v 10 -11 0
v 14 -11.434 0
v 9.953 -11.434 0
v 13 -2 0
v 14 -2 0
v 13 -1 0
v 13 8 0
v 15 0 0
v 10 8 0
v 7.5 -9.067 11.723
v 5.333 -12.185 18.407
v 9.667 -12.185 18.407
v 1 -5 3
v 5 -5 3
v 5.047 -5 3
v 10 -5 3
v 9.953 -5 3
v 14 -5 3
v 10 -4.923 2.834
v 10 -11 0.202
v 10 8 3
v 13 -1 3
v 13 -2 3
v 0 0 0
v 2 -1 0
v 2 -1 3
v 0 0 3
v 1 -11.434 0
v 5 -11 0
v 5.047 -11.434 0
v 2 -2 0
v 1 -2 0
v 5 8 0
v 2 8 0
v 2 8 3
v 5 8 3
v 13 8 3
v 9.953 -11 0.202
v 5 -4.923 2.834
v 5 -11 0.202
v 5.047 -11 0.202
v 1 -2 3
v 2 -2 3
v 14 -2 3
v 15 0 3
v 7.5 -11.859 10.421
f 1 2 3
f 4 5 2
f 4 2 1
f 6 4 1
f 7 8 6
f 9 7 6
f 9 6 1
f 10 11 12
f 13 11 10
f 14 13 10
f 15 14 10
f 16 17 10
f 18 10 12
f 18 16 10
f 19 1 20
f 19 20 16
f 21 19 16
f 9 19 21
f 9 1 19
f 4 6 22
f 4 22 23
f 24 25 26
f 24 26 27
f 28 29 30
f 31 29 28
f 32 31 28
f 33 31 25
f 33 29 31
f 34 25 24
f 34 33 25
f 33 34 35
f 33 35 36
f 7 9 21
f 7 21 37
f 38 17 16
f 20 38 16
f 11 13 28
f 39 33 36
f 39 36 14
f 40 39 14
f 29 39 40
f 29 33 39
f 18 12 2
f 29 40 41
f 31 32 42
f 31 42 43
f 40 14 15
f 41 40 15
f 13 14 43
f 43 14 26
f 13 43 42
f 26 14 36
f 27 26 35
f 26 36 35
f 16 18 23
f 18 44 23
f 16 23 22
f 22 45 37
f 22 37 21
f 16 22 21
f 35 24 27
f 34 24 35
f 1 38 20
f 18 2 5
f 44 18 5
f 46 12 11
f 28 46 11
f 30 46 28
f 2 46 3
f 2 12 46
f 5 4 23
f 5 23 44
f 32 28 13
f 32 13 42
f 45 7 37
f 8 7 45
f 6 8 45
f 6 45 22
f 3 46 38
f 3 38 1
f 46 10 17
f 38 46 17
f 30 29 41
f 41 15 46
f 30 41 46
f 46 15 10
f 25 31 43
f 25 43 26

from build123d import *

# Parameters (mm, degrees)
PAD_DEPTH       = 3
POCKET_DEPTH    = 14.001
SKETCH002_W     = 13
SKETCH002_H     = 7.0986047495
PAD001_DEPTH    = 17
POCKET001_DEPTH = 14.001
POCKET002_DEPTH = 7.7802325517


with BuildPart() as part:
    # Sketch → Pad (new body)
    with BuildSketch(Plane.XY):
        Polygon((0, 0), (2, 8), (5, 8), (5, -11), (10, -11), (10, 8), (13, 8), (15, 0), (13, -1), (13, -2), (14, -2), (14, -12), (1, -12), (1, -2), (2, -2), (2, -1), align=None)
    extrude(amount=PAD_DEPTH)

    # Sketch001 (on Face4 of Pad) → Pocket (cut, through all)
    with BuildSketch(Plane.YZ.offset(14)):
        Polygon((-5, 3), (-11.4335207615, 0), (-12, 0), (-12, 3), align=None)
    extrude(amount=-POCKET_DEPTH, mode=Mode.SUBTRACT)

    # Sketch002 (on Face9 of Pocket) → Pad001 (join)
    with BuildSketch(Plane(origin=(0, -2.0420976405, 4.3792925223), x_dir=(1, 0, 0), z_dir=(0, -0.4226182617, 0.906307787))):
        with Locations((7.5, -6.8129865247)):
            Rectangle(SKETCH002_W, SKETCH002_H)
    extrude(amount=PAD001_DEPTH)

    # Sketch003 (on Face20 of Pad001) → Pocket001 (cut, through all)
    with BuildSketch(Plane.YZ.offset(14)):
        Polygon((-12.1845104496, 18.4072323796), (-11.4335207615, 0), (-18.6180312111, 15.4072323796), align=None)
    extrude(amount=-POCKET001_DEPTH, mode=Mode.SUBTRACT)

    # Sketch004 (on Face19 of Pocket001) → Pocket002 (cut, through all)
    with BuildSketch(Plane(origin=(0, -2.9579023595, -1.3792925223), x_dir=(-1, 0, 0), z_dir=(0, 0.906307787, 0.4226182617))):
        Polygon((-14, 21.8320146698), (-9.6666666667, 21.8320146698), (-14, 4.8320146698), align=None)
        Polygon((-5.3333333333, 21.8320146698), (-1, 21.8320146698), (-1, 4.8320146698), align=None)
        Polygon((-10, 4.6488008791), (-5, 4.6488008791), (-7.4999999998, 14.4564931874), align=None)
    extrude(amount=-POCKET002_DEPTH, mode=Mode.SUBTRACT)


solid = part.part
